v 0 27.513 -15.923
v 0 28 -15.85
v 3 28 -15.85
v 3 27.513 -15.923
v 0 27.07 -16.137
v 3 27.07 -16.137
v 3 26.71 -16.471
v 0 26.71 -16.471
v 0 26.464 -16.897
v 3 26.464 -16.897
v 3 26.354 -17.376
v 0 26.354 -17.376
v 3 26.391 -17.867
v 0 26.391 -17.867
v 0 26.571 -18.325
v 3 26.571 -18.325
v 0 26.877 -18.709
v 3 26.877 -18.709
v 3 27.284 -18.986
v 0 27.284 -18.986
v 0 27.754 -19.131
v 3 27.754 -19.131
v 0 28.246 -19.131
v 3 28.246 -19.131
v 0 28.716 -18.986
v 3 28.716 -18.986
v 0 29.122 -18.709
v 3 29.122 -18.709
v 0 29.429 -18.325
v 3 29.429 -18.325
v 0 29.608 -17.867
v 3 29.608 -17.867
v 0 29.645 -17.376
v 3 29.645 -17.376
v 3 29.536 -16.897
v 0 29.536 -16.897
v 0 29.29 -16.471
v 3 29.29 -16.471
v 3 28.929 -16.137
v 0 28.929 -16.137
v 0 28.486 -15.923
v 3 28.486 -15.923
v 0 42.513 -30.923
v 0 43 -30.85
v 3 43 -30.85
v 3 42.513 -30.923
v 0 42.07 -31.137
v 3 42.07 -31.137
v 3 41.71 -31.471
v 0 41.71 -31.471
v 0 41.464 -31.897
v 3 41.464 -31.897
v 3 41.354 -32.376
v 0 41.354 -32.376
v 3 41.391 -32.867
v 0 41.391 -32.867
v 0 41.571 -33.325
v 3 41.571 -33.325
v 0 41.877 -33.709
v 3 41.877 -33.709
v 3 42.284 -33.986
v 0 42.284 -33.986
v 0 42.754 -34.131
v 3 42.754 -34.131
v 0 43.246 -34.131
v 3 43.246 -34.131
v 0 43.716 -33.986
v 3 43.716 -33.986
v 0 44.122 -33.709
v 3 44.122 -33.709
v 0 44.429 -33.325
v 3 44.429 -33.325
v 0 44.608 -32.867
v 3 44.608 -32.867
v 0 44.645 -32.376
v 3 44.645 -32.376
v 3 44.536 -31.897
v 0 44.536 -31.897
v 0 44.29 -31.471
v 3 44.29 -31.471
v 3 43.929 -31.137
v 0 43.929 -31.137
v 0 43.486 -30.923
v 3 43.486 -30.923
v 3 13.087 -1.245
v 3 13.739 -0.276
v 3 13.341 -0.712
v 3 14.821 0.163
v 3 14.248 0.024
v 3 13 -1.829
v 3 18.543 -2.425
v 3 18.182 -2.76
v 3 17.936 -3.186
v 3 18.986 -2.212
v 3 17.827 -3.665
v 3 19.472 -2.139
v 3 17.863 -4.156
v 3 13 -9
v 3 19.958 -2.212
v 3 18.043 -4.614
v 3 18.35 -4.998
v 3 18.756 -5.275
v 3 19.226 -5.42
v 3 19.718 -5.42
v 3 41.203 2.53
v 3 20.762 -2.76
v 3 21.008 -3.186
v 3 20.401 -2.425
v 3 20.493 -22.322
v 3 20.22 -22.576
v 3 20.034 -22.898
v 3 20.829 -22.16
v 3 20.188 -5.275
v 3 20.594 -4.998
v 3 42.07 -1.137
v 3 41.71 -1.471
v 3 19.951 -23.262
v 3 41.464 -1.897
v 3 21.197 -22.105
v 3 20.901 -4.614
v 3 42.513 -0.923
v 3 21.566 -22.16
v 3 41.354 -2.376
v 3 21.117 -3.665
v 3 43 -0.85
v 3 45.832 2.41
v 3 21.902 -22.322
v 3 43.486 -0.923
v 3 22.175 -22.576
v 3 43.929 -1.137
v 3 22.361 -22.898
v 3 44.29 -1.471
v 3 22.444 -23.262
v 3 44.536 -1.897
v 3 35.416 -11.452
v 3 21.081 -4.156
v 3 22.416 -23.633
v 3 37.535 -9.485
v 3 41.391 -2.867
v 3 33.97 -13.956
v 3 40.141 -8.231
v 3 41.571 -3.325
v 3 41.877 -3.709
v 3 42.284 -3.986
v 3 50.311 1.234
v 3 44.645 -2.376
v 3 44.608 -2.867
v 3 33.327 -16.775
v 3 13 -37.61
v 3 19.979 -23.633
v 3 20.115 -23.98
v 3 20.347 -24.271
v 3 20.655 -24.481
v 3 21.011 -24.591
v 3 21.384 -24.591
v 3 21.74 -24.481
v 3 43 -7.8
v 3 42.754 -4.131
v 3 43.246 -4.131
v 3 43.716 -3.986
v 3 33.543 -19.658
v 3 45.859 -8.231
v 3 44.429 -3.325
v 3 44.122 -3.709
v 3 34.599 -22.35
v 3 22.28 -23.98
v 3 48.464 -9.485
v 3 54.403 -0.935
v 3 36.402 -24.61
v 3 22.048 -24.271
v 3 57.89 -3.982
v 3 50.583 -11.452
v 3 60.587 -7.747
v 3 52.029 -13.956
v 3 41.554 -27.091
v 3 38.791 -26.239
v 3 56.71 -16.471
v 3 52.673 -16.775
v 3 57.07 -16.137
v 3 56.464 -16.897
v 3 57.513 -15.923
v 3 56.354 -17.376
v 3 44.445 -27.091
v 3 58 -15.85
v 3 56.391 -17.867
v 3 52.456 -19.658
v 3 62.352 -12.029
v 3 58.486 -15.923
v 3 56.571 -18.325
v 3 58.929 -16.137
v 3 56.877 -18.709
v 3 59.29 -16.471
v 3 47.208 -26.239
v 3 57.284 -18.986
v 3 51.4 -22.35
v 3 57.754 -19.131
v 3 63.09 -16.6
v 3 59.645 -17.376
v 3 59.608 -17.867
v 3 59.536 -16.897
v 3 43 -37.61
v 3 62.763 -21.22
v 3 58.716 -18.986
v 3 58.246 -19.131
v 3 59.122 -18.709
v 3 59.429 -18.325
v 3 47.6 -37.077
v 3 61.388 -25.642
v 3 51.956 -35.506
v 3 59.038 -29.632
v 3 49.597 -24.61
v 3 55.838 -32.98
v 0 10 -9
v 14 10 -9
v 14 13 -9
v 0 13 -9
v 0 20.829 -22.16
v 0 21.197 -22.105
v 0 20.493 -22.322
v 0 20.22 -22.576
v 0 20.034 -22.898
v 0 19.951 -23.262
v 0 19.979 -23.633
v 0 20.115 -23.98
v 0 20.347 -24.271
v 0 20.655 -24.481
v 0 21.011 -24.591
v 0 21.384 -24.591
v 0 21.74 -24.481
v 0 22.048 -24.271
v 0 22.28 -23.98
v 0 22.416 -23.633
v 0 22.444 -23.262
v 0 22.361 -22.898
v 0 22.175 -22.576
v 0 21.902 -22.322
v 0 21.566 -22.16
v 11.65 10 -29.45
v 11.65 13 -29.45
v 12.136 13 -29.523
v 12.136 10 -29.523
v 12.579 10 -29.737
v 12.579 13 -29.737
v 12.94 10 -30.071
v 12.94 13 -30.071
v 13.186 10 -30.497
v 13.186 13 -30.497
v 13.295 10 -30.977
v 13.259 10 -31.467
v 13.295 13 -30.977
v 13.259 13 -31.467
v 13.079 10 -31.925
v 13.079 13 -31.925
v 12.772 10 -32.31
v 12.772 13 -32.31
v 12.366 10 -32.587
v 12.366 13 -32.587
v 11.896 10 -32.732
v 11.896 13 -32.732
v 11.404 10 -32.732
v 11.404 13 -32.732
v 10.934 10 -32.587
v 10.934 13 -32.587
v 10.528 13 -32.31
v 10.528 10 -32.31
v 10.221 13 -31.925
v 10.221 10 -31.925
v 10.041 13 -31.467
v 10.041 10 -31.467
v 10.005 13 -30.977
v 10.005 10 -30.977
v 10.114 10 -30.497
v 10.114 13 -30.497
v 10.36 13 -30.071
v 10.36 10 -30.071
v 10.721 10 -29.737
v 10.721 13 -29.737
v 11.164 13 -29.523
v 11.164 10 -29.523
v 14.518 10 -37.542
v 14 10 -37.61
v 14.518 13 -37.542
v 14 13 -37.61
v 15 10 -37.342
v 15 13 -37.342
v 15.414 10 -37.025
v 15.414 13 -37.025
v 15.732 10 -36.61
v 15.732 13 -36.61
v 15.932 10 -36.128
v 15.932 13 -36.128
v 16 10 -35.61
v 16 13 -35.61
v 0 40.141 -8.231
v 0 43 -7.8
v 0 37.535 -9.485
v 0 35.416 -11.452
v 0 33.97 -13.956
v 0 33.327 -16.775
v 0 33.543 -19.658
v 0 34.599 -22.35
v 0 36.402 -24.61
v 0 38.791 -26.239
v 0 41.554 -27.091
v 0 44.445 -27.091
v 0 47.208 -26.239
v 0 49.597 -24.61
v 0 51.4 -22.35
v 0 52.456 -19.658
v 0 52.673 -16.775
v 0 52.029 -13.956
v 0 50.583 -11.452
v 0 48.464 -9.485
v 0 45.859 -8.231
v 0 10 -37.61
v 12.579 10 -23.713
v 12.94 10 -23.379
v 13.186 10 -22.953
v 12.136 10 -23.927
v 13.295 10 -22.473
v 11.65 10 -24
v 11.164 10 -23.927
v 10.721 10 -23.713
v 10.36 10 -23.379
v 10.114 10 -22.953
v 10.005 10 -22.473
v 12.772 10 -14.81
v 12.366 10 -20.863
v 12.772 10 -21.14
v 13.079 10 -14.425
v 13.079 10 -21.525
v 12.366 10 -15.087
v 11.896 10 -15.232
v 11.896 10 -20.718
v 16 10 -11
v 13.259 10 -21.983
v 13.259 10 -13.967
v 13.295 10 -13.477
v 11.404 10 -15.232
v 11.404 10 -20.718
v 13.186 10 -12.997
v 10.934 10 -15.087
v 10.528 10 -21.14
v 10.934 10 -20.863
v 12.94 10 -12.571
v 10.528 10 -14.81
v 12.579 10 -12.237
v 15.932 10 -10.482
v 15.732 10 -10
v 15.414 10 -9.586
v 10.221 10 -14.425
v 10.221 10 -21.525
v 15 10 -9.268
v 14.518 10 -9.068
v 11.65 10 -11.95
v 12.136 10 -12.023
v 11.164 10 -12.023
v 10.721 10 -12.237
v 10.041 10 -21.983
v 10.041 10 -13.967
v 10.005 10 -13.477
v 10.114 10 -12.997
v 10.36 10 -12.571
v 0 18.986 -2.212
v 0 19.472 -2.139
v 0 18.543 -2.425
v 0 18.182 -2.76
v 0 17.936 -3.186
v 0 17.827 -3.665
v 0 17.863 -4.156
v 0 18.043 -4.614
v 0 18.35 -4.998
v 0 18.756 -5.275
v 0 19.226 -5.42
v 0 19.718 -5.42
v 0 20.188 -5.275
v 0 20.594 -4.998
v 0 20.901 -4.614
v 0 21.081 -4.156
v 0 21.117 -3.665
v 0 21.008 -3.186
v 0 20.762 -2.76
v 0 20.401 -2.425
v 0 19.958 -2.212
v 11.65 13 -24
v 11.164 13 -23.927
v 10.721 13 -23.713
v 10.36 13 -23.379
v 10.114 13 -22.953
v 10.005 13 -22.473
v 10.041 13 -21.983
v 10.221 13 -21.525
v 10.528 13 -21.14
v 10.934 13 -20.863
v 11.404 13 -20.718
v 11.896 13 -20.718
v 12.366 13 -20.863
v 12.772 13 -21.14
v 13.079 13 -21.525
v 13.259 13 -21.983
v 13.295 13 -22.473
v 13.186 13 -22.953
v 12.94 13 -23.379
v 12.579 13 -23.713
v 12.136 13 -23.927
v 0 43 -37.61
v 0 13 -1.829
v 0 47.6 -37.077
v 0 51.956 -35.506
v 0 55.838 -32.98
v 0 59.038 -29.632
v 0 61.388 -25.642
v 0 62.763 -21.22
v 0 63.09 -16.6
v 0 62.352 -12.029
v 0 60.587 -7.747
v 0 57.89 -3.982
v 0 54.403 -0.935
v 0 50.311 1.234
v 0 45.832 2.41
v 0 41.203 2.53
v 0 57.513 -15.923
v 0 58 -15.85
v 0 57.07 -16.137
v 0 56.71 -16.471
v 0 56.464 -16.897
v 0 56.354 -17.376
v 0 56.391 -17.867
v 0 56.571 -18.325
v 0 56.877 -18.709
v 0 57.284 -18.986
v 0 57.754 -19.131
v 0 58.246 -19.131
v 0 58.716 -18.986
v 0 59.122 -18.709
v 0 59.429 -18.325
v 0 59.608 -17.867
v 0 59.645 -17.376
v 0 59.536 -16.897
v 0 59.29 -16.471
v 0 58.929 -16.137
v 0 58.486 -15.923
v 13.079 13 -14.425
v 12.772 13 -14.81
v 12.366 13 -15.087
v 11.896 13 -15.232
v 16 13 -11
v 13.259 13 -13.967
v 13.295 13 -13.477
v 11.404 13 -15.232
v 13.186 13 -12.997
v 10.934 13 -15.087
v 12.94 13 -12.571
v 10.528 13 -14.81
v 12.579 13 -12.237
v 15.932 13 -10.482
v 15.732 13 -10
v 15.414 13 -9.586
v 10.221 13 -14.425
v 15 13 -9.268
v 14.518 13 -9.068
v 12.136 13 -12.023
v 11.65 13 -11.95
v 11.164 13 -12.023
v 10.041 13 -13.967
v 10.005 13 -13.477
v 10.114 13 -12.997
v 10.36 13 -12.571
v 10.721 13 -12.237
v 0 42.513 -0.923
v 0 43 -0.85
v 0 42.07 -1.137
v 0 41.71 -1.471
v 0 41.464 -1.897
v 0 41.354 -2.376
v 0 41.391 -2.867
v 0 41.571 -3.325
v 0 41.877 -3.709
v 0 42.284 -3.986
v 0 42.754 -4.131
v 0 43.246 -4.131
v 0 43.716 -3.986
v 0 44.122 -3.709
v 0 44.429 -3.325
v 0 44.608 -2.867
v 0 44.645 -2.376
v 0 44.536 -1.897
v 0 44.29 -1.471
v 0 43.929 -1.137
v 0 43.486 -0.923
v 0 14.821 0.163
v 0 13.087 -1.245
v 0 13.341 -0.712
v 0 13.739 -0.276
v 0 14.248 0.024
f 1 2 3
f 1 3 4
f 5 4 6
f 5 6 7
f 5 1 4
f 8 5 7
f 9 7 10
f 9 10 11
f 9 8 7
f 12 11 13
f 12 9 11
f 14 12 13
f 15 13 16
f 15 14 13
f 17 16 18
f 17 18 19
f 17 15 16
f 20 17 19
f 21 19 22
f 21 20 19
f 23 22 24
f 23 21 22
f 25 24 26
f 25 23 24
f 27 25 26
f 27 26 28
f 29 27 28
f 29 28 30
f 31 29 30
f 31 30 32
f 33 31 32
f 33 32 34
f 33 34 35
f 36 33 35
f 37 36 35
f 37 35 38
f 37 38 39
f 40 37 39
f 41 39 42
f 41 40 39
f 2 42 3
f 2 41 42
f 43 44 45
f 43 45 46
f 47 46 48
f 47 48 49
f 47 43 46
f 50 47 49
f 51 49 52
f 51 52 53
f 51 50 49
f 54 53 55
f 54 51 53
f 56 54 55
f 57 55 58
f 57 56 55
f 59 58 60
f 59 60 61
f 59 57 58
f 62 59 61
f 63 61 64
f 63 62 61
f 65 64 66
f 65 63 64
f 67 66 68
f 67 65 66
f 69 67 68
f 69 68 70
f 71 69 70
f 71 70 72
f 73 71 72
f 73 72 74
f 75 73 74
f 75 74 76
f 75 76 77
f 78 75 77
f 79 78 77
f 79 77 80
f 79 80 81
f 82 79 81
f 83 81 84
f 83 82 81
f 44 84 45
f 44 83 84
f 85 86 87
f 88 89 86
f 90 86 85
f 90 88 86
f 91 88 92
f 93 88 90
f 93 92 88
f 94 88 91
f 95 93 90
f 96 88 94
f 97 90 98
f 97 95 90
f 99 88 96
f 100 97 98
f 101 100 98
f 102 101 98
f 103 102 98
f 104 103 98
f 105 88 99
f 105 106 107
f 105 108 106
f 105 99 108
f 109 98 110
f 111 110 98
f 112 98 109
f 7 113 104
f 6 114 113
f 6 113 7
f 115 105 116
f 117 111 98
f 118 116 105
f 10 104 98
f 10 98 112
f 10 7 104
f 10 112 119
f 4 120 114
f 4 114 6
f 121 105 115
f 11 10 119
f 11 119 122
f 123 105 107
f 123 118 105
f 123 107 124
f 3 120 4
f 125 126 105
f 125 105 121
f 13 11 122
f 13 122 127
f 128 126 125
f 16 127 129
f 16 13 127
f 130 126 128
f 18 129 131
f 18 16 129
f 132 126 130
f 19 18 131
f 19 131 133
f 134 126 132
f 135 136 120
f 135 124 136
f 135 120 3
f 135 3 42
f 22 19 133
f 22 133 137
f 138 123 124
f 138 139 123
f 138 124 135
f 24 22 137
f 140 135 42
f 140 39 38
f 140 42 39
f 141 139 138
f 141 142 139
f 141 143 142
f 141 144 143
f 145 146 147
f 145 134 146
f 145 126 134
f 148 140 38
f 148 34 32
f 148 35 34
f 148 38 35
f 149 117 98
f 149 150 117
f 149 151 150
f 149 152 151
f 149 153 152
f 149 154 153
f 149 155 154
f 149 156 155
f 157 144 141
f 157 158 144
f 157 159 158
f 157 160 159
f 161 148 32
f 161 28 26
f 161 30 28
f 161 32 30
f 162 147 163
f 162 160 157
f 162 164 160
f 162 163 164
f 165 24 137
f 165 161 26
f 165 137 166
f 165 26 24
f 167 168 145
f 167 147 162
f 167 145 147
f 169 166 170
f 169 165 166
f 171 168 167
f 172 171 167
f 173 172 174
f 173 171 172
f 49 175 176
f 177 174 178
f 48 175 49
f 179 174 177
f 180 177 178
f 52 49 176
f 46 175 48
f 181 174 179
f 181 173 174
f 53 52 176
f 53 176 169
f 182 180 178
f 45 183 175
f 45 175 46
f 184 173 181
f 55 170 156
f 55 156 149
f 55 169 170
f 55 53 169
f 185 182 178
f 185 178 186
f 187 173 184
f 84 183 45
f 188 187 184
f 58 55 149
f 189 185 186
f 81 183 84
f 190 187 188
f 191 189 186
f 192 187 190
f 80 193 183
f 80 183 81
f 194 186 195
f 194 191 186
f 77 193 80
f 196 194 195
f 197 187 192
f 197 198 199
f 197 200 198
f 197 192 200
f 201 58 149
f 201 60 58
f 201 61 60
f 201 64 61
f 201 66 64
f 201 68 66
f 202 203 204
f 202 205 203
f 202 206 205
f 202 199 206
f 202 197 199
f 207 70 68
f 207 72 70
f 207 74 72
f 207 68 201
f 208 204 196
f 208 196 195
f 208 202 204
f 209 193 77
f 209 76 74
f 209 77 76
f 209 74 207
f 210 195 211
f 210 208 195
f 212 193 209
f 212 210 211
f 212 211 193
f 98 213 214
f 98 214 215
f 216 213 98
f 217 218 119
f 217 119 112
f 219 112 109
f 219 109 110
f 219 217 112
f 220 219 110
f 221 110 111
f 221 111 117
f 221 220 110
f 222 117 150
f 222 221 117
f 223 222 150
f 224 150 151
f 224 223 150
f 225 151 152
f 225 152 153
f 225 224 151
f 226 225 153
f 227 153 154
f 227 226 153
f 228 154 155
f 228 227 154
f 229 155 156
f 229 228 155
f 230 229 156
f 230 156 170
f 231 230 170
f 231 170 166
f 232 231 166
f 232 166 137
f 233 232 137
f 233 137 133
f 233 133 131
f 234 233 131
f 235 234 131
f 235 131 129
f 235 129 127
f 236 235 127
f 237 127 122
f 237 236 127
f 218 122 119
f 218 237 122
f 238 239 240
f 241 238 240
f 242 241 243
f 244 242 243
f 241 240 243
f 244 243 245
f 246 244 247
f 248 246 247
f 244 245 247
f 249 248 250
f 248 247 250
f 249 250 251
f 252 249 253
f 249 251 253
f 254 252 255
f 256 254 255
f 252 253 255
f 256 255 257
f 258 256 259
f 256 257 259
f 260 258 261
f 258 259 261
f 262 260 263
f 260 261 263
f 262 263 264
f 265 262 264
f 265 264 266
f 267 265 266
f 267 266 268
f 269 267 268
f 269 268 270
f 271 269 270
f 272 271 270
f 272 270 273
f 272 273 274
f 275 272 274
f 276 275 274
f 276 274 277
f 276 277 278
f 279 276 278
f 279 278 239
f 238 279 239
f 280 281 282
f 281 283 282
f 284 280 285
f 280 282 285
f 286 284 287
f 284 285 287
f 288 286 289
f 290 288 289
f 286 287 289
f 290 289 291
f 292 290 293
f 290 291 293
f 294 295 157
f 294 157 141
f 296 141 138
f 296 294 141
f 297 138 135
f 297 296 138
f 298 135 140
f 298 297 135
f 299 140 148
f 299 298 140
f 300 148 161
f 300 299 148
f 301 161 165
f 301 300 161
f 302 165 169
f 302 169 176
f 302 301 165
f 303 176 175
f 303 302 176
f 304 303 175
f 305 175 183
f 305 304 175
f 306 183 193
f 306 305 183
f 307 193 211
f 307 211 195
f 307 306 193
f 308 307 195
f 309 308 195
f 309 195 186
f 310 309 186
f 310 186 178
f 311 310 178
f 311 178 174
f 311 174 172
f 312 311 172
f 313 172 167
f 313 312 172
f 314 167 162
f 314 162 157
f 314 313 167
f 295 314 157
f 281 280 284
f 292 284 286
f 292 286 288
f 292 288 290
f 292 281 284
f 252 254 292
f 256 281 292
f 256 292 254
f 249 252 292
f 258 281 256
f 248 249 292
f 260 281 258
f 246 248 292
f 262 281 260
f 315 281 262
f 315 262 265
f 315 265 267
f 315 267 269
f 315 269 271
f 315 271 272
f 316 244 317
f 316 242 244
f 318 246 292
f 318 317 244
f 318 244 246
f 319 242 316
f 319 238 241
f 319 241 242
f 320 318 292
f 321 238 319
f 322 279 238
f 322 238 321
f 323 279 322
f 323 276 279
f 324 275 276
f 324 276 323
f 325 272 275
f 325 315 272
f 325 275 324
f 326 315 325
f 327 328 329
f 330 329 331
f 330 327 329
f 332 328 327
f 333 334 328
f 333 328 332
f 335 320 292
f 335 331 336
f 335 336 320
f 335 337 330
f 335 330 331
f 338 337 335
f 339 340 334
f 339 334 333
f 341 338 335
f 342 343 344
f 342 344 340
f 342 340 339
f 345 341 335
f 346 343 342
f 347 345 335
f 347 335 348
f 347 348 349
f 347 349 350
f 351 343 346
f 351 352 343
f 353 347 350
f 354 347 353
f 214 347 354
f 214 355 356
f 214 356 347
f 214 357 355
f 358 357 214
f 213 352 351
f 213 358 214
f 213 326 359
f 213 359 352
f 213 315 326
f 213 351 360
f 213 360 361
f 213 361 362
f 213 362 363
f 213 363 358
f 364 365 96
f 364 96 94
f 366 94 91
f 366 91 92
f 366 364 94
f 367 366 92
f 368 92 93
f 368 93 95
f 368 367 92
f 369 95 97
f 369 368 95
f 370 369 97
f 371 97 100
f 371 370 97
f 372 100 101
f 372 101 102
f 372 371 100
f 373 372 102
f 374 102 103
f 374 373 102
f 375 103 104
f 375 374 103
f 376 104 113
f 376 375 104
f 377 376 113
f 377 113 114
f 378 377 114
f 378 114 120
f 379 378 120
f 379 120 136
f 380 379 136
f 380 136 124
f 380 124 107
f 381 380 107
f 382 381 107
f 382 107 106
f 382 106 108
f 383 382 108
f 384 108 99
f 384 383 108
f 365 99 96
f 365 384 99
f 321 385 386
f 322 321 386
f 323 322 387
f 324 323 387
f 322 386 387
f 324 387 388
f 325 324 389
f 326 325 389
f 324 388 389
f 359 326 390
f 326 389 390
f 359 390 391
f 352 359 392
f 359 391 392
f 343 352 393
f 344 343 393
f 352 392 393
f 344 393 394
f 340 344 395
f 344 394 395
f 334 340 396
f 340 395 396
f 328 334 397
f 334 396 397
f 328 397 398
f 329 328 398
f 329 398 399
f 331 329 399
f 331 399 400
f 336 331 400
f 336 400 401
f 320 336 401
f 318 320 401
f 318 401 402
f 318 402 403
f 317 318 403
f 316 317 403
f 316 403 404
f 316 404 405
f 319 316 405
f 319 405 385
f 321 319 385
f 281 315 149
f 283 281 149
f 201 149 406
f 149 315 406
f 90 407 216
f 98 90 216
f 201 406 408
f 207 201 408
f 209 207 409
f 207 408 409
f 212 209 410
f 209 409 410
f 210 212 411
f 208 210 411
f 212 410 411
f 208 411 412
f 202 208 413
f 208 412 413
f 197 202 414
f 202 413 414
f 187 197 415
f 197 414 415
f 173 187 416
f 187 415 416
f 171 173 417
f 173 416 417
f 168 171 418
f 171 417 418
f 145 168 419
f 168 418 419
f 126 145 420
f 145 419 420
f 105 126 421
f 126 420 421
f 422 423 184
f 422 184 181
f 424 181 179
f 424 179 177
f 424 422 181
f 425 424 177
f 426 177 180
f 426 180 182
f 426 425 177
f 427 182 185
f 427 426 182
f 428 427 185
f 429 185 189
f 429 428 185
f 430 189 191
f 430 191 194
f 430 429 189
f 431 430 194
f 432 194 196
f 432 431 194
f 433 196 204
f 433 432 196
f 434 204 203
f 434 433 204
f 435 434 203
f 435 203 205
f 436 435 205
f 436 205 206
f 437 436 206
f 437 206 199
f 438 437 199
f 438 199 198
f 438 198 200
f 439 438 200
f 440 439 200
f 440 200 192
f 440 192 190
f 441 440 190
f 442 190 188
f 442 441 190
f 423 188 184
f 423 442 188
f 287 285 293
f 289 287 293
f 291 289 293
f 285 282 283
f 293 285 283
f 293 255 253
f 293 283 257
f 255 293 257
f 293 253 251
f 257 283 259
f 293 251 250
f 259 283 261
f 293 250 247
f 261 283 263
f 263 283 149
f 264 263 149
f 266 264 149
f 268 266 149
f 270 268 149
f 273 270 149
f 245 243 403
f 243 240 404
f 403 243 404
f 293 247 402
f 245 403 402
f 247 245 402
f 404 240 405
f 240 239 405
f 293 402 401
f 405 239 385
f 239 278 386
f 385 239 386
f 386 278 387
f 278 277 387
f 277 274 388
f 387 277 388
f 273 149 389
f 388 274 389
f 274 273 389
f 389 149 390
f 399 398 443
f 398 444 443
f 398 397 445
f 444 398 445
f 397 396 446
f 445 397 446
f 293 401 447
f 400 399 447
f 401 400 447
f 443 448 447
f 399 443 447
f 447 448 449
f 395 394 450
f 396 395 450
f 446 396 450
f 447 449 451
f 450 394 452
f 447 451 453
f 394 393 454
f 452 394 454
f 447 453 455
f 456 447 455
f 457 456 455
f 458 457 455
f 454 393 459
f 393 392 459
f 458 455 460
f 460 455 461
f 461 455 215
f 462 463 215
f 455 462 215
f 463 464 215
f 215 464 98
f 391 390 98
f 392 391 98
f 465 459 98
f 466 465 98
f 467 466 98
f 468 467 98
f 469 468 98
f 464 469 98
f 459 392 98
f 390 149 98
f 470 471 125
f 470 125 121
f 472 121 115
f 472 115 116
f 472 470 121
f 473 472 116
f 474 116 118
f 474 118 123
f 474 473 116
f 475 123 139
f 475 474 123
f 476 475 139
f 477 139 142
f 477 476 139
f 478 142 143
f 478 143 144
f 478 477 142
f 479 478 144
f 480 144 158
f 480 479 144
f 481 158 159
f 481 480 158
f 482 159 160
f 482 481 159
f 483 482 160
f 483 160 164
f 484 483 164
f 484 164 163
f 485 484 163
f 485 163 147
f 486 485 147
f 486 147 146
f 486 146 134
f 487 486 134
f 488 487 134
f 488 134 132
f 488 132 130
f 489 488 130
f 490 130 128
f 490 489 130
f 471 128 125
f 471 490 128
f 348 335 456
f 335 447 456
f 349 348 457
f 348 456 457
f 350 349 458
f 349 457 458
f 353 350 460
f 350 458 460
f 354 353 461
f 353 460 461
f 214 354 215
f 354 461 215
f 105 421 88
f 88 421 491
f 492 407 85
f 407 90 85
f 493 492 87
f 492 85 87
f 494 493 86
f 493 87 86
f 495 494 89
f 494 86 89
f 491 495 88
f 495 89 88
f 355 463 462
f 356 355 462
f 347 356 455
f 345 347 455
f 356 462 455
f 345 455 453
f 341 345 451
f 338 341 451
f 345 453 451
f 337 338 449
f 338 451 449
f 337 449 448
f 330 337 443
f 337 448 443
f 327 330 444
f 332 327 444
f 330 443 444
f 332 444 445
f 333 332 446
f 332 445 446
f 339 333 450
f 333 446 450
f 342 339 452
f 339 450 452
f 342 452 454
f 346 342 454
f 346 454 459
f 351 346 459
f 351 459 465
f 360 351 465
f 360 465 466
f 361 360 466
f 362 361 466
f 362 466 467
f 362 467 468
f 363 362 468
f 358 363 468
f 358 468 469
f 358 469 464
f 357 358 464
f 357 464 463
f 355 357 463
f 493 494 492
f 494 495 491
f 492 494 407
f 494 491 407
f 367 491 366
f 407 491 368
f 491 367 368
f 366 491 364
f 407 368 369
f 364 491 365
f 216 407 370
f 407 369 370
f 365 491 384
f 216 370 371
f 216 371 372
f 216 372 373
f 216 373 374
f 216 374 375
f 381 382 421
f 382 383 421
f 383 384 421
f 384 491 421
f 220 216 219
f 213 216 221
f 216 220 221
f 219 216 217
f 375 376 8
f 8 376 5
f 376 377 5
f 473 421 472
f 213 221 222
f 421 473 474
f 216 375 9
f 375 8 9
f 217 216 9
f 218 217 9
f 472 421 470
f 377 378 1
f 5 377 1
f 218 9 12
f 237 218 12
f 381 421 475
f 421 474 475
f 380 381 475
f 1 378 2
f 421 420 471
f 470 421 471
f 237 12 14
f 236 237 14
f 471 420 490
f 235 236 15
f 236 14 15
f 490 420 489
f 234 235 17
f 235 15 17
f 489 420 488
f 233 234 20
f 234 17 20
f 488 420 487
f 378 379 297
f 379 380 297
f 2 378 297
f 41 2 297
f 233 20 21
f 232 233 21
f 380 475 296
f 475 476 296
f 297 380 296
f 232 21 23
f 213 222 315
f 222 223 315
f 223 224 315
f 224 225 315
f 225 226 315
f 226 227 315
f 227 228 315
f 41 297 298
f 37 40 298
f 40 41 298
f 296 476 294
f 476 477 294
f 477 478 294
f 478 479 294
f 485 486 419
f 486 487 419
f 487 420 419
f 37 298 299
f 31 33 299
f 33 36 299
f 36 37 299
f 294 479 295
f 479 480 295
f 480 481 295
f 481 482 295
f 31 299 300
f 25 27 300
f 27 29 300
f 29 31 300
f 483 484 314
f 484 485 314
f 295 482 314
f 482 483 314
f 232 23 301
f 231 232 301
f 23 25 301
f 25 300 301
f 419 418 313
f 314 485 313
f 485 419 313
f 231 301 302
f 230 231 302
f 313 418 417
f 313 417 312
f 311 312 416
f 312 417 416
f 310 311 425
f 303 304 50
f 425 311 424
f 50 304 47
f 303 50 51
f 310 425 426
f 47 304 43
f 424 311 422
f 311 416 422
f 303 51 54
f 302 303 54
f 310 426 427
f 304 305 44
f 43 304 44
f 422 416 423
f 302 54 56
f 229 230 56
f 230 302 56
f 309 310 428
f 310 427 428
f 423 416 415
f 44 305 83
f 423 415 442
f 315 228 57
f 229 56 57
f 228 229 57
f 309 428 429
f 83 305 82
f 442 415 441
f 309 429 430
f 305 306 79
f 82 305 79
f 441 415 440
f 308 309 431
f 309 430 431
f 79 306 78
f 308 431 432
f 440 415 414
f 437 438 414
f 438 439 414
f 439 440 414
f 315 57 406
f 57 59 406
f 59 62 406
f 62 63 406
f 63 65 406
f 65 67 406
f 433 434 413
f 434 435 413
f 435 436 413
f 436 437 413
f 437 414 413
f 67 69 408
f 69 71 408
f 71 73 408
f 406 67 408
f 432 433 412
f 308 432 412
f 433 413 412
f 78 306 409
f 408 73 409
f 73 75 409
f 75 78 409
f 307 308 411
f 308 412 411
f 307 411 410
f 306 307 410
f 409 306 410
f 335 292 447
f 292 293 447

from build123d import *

# Parameters (mm, degrees)
SKETCH_2_W          = 28.61033589
SKETCH_2_H          = 3
EXTRUDE_5_DEPTH     = 16
SKETCH_3_R          = 1.65
CUT_EXTRUDE_1_DEPTH = 10
SKETCH_4_R          = 1.65
SKETCH_4_R_2        = 1.25
SKETCH_4_R_3        = 9.7
EXTRUDE_8_DEPTH     = 3
FILLET_1_R          = 2


with BuildPart() as part:
    # 草图2 → 凸台-拉伸5 (new body)
    with BuildSketch(Plane.ZY):
        with Locations((-23.305167945, 11.5)):
            Rectangle(SKETCH_2_W, SKETCH_2_H)
    extrude(amount=-EXTRUDE_5_DEPTH)

    # 草图3 → 切除-拉伸1 (cut)
    with BuildSketch(Plane(origin=(0, 13, 0), x_dir=(1, 0, 0), z_dir=(0, 1, 0))):
        with Locations(Location((11.65, 31.1, 0), (0, 0, 270))):
            Circle(SKETCH_3_R)
        with Locations(Location((11.65, 22.35, 0), (0, 0, 90))):
            Circle(SKETCH_3_R)
        with Locations(Location((11.65, 13.6, 0), (0, 0, 270))):
            Circle(SKETCH_3_R)
    extrude(amount=-CUT_EXTRUDE_1_DEPTH, mode=Mode.SUBTRACT)

    # 草图4 → 凸台-拉伸8 (add)
    with BuildSketch(Plane(origin=(0, 0, 0), x_dir=(0, 0, -1), z_dir=(1, 0, 0))):
        with BuildLine():
            Line((0, 13), (37.61033589, 13))
            Line((37.61033589, 13), (37.61033589, 42.99965258))
            ThreePointArc((37.61033589, 42.99965258), (16.600372012, 63.090063758), (-2.530280254, 41.20259366))
            Line((-2.530280254, 41.20259366), (0, 13))
        make_face()
        with Locations(Location((17.49980147, 57.99965258, 0), (0, 0, 180))):
            Circle(SKETCH_4_R, mode=Mode.SUBTRACT)
        with Locations(Location((32.49980147, 42.99965258, 0), (0, 0, 180))):
            Circle(SKETCH_4_R, mode=Mode.SUBTRACT)
        with Locations(Location((17.49980147, 27.99965258, 0), (0, 0, 180))):
            Circle(SKETCH_4_R, mode=Mode.SUBTRACT)
        with Locations(Location((2.49980147, 42.99965258, 0), (0, 0, 180))):
            Circle(SKETCH_4_R, mode=Mode.SUBTRACT)
        with Locations(Location((23.354935737, 21.197394906, 0), (0, 0, 180))):
            Circle(SKETCH_4_R_2, mode=Mode.SUBTRACT)
        with Locations(Location((3.788610616, 19.472011044, 0), (0, 0, 180))):
            Circle(SKETCH_4_R, mode=Mode.SUBTRACT)
        with Locations(Location((17.49980147, 42.99965258, 0), (0, 0, 180))):
            Circle(SKETCH_4_R_3, mode=Mode.SUBTRACT)
    extrude(amount=EXTRUDE_8_DEPTH)

    # 圆角1
    fillet_1_edges = [part.edges().sort_by_distance(p)[0] for p in [
        (16, 11.5, -37.61033589),
        (1.5, 13, 0),
        (16, 11.5, -9),
    ]]
    fillet(fillet_1_edges, radius=FILLET_1_R)


solid = part.part
